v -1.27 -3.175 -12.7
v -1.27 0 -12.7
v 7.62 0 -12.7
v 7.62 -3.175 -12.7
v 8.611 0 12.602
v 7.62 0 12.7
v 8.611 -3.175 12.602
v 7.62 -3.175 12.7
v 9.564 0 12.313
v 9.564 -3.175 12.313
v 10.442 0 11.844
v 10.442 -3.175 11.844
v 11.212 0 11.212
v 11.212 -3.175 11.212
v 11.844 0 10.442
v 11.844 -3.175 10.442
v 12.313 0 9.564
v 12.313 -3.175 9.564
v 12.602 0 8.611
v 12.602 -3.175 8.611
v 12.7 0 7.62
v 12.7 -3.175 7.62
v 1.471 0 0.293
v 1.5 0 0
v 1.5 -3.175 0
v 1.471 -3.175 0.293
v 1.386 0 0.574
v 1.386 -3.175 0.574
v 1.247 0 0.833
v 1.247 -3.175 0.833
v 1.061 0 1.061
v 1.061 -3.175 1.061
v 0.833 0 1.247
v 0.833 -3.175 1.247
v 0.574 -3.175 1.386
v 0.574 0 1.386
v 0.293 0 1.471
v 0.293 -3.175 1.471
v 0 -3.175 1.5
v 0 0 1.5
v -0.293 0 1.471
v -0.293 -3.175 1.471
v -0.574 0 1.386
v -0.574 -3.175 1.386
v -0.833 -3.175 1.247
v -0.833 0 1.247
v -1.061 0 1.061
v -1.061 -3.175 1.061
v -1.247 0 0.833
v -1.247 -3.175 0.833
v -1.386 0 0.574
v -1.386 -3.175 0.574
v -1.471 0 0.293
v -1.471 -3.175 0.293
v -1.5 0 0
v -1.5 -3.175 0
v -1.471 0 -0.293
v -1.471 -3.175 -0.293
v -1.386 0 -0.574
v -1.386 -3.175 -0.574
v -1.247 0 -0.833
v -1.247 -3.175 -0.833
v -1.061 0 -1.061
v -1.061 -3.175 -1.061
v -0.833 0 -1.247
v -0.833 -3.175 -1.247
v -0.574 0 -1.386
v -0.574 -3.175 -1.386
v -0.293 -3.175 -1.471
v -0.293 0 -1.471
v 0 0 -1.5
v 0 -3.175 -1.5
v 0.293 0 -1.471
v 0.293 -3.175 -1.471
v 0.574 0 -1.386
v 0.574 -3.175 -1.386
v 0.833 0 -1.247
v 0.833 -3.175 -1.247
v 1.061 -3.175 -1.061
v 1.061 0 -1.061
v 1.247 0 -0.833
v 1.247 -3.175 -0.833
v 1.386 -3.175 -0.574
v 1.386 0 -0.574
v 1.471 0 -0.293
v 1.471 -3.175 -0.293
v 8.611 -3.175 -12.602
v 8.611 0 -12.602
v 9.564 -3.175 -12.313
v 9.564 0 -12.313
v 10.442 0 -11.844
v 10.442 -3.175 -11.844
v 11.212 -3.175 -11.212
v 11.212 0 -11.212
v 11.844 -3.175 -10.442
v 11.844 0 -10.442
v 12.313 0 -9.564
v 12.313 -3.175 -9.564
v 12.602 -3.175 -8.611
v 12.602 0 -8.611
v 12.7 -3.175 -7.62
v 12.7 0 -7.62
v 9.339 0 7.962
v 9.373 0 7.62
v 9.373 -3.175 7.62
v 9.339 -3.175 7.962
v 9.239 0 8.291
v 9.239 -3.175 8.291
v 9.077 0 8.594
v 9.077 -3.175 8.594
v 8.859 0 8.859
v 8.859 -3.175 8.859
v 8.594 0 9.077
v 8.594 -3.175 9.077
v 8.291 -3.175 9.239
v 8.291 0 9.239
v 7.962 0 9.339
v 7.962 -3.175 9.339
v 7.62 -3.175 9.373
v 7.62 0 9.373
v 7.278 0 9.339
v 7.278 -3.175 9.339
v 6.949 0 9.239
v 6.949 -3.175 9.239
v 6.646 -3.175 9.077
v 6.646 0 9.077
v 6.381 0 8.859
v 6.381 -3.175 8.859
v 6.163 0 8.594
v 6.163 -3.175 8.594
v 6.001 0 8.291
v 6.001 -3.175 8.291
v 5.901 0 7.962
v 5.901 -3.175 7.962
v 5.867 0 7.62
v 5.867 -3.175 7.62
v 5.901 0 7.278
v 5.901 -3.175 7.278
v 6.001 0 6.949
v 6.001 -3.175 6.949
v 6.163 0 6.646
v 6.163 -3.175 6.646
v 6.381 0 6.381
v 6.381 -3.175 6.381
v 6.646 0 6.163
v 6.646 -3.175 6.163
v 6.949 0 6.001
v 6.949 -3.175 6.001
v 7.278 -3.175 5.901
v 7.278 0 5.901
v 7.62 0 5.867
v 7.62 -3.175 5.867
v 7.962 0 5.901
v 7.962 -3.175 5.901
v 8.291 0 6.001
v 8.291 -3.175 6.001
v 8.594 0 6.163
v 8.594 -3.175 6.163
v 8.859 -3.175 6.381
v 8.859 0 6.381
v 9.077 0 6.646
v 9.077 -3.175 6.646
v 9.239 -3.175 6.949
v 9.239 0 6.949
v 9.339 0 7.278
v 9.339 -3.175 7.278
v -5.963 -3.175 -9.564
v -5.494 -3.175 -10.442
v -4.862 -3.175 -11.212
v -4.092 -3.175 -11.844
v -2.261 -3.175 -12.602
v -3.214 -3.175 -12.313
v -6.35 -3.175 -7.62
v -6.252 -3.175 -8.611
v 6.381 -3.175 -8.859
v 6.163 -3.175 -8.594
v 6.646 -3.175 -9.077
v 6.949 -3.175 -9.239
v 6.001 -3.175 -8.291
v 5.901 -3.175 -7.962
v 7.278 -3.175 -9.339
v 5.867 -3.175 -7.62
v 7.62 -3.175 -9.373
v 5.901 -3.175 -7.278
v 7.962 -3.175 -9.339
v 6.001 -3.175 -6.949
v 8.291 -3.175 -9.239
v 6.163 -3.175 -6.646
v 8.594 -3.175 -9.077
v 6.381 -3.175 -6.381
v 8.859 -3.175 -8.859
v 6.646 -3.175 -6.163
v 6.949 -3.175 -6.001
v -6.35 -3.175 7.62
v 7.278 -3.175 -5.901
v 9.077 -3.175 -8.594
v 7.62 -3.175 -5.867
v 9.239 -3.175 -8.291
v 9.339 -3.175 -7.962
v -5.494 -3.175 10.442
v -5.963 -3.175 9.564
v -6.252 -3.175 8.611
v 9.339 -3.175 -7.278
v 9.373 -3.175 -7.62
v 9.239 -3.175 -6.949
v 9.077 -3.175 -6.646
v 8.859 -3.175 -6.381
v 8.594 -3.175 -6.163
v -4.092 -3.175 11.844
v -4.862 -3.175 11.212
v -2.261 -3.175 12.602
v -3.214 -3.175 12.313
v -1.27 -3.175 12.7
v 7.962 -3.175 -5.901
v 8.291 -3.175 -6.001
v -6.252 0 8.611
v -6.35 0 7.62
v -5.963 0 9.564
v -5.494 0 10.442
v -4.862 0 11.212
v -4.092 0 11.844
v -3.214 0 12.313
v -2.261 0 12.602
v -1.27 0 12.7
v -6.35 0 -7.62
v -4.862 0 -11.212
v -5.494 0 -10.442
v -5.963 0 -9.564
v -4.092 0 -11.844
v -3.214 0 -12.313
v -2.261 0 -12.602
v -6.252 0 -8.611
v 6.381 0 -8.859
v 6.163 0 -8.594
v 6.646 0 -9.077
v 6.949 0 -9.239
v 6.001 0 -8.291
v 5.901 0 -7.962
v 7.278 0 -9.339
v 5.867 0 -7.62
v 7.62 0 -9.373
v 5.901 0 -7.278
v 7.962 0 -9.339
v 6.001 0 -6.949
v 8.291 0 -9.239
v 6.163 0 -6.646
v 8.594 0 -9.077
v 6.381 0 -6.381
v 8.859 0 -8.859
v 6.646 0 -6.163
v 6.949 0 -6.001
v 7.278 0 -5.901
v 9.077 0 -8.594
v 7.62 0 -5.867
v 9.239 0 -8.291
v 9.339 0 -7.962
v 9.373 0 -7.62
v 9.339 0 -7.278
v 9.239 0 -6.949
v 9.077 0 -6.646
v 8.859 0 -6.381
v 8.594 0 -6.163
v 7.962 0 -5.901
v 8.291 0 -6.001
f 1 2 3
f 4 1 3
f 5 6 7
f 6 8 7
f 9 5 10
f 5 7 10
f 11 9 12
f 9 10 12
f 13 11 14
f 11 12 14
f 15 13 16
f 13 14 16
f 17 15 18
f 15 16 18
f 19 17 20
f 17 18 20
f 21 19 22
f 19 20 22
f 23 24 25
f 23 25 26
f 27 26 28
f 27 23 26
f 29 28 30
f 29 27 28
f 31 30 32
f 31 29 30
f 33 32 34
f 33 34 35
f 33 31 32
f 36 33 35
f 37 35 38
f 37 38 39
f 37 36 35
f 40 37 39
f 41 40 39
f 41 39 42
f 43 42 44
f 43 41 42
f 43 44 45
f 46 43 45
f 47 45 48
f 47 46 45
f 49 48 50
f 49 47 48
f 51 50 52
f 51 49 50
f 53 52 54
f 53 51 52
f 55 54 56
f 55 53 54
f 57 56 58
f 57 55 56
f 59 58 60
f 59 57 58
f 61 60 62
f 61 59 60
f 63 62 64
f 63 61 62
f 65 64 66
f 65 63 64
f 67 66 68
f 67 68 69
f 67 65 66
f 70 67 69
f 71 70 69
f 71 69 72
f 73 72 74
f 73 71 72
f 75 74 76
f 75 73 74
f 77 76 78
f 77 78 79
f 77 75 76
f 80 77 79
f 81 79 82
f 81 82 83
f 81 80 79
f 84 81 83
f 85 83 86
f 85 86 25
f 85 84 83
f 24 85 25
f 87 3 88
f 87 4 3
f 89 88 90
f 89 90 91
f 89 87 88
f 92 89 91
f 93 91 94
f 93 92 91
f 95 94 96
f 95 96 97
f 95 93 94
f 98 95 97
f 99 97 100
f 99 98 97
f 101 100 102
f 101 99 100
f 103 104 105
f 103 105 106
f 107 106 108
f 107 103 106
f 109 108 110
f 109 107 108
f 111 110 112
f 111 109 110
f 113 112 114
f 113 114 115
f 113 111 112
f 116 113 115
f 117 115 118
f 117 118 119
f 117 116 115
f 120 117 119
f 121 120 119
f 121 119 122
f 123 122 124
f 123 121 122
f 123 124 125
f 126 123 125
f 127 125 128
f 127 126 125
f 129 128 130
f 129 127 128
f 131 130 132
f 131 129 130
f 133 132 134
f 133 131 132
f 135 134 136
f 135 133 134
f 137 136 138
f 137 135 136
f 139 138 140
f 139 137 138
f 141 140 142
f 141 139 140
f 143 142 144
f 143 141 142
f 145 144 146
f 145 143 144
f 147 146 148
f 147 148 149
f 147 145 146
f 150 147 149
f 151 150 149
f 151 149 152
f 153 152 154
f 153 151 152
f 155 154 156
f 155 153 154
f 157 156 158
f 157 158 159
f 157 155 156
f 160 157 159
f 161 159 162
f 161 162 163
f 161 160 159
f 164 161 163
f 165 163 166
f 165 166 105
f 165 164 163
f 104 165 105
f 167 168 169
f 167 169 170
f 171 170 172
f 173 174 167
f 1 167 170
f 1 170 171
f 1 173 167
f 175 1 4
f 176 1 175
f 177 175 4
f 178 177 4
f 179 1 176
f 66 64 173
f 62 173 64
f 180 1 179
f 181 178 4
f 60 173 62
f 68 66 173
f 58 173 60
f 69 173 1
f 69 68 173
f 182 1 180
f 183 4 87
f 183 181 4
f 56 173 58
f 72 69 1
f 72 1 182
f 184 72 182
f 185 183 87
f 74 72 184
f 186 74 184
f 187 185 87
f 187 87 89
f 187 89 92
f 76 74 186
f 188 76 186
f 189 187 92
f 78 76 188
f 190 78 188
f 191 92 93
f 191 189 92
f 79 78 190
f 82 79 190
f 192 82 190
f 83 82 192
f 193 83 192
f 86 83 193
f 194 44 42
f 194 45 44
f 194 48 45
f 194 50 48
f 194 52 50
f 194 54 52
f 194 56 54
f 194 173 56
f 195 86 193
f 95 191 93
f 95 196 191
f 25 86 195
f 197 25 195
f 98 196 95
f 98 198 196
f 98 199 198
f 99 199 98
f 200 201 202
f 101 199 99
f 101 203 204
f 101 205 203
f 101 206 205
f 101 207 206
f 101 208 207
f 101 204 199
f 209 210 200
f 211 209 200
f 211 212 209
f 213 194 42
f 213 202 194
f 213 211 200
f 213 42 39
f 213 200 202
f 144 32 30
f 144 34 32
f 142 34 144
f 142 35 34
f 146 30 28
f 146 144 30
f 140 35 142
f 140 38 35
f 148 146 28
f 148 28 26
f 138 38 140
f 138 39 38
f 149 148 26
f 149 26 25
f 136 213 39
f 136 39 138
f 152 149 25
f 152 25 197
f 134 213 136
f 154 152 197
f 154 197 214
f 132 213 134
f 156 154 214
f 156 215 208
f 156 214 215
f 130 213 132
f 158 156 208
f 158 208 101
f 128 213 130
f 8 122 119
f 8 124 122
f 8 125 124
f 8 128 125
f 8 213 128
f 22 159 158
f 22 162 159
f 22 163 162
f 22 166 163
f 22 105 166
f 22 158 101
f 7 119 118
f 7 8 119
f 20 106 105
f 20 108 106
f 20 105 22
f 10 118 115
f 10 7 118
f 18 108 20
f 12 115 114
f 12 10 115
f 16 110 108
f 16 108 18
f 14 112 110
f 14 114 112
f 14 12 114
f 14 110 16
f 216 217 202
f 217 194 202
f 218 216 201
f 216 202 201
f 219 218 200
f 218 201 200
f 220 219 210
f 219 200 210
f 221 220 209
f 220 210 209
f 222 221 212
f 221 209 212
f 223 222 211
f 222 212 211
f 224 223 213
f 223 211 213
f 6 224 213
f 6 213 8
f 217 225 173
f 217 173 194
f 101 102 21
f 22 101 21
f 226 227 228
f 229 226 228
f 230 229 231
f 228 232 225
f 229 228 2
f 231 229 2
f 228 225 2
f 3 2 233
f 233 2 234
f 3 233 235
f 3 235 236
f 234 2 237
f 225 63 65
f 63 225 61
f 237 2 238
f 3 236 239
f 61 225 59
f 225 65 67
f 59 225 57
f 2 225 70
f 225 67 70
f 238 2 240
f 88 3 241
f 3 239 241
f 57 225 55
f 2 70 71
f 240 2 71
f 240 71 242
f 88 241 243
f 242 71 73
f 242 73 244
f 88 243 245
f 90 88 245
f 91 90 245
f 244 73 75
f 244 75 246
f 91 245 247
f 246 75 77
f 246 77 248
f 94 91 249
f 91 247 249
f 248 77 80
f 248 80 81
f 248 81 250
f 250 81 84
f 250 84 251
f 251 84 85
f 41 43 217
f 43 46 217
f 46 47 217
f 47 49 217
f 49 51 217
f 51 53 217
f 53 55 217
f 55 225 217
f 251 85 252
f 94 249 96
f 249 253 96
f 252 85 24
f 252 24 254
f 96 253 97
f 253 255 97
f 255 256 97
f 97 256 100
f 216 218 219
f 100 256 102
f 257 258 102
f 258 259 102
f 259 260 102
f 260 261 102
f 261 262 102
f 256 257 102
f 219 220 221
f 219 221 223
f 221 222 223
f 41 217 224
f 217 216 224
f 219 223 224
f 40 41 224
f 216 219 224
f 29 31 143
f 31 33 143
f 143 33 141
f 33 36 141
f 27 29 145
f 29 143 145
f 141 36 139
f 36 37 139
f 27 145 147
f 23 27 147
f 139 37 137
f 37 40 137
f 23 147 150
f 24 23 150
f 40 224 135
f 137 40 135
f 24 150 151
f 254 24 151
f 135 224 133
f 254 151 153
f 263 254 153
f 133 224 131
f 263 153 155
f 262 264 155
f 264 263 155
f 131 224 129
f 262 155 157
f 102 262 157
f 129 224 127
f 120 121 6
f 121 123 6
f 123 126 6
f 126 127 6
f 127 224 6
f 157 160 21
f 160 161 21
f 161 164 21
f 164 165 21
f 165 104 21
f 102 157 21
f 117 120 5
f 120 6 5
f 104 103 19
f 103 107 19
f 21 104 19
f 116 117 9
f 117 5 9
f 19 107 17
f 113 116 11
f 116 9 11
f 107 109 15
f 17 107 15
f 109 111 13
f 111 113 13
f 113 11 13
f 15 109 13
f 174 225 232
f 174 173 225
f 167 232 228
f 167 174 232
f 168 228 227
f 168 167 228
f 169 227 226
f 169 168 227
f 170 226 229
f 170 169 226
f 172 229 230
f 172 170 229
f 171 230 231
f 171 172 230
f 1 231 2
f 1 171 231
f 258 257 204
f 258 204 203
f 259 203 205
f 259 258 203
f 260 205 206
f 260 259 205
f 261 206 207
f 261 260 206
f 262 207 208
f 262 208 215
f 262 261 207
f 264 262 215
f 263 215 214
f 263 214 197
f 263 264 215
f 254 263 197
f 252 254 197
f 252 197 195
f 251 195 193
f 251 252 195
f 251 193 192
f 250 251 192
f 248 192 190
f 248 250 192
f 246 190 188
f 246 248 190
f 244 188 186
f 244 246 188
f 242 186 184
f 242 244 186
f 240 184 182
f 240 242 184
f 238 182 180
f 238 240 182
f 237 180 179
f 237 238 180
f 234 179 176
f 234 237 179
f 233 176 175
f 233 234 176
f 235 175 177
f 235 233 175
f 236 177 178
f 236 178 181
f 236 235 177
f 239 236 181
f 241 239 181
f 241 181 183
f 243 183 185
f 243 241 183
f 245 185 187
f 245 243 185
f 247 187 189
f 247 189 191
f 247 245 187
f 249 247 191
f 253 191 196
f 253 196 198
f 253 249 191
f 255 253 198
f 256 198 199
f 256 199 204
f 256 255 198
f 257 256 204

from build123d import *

# Parameters (mm, degrees)
F0_W     = 19.05
F0_H     = 25.4
F0_R     = 1.5
F0_R_2   = 1.7526
F1_DEPTH = 3.175
F2_R     = 5.08


with BuildPart() as f1:
    # F0 (on Front) → F1 (new body)
    with BuildSketch(Plane.XZ):
        with Locations((3.175, 0)):
            Rectangle(F0_W, F0_H)
        Circle(F0_R, mode=Mode.SUBTRACT)
        with Locations((7.62, -7.62)):
            Circle(F0_R_2, mode=Mode.SUBTRACT)
        with Locations((7.62, 7.62)):
            Circle(F0_R_2, mode=Mode.SUBTRACT)
    extrude(amount=F1_DEPTH)

    # F2
    f2_edges = [f1.edges().sort_by_distance(p)[0] for p in [
        (12.7, -1.5875, 12.7),
        (12.7, -1.5875, -12.7),
        (-6.35, -1.5875, 12.7),
        (-6.35, -1.5875, -12.7),
    ]]
    fillet(f2_edges, radius=F2_R)


solid = f1.part
